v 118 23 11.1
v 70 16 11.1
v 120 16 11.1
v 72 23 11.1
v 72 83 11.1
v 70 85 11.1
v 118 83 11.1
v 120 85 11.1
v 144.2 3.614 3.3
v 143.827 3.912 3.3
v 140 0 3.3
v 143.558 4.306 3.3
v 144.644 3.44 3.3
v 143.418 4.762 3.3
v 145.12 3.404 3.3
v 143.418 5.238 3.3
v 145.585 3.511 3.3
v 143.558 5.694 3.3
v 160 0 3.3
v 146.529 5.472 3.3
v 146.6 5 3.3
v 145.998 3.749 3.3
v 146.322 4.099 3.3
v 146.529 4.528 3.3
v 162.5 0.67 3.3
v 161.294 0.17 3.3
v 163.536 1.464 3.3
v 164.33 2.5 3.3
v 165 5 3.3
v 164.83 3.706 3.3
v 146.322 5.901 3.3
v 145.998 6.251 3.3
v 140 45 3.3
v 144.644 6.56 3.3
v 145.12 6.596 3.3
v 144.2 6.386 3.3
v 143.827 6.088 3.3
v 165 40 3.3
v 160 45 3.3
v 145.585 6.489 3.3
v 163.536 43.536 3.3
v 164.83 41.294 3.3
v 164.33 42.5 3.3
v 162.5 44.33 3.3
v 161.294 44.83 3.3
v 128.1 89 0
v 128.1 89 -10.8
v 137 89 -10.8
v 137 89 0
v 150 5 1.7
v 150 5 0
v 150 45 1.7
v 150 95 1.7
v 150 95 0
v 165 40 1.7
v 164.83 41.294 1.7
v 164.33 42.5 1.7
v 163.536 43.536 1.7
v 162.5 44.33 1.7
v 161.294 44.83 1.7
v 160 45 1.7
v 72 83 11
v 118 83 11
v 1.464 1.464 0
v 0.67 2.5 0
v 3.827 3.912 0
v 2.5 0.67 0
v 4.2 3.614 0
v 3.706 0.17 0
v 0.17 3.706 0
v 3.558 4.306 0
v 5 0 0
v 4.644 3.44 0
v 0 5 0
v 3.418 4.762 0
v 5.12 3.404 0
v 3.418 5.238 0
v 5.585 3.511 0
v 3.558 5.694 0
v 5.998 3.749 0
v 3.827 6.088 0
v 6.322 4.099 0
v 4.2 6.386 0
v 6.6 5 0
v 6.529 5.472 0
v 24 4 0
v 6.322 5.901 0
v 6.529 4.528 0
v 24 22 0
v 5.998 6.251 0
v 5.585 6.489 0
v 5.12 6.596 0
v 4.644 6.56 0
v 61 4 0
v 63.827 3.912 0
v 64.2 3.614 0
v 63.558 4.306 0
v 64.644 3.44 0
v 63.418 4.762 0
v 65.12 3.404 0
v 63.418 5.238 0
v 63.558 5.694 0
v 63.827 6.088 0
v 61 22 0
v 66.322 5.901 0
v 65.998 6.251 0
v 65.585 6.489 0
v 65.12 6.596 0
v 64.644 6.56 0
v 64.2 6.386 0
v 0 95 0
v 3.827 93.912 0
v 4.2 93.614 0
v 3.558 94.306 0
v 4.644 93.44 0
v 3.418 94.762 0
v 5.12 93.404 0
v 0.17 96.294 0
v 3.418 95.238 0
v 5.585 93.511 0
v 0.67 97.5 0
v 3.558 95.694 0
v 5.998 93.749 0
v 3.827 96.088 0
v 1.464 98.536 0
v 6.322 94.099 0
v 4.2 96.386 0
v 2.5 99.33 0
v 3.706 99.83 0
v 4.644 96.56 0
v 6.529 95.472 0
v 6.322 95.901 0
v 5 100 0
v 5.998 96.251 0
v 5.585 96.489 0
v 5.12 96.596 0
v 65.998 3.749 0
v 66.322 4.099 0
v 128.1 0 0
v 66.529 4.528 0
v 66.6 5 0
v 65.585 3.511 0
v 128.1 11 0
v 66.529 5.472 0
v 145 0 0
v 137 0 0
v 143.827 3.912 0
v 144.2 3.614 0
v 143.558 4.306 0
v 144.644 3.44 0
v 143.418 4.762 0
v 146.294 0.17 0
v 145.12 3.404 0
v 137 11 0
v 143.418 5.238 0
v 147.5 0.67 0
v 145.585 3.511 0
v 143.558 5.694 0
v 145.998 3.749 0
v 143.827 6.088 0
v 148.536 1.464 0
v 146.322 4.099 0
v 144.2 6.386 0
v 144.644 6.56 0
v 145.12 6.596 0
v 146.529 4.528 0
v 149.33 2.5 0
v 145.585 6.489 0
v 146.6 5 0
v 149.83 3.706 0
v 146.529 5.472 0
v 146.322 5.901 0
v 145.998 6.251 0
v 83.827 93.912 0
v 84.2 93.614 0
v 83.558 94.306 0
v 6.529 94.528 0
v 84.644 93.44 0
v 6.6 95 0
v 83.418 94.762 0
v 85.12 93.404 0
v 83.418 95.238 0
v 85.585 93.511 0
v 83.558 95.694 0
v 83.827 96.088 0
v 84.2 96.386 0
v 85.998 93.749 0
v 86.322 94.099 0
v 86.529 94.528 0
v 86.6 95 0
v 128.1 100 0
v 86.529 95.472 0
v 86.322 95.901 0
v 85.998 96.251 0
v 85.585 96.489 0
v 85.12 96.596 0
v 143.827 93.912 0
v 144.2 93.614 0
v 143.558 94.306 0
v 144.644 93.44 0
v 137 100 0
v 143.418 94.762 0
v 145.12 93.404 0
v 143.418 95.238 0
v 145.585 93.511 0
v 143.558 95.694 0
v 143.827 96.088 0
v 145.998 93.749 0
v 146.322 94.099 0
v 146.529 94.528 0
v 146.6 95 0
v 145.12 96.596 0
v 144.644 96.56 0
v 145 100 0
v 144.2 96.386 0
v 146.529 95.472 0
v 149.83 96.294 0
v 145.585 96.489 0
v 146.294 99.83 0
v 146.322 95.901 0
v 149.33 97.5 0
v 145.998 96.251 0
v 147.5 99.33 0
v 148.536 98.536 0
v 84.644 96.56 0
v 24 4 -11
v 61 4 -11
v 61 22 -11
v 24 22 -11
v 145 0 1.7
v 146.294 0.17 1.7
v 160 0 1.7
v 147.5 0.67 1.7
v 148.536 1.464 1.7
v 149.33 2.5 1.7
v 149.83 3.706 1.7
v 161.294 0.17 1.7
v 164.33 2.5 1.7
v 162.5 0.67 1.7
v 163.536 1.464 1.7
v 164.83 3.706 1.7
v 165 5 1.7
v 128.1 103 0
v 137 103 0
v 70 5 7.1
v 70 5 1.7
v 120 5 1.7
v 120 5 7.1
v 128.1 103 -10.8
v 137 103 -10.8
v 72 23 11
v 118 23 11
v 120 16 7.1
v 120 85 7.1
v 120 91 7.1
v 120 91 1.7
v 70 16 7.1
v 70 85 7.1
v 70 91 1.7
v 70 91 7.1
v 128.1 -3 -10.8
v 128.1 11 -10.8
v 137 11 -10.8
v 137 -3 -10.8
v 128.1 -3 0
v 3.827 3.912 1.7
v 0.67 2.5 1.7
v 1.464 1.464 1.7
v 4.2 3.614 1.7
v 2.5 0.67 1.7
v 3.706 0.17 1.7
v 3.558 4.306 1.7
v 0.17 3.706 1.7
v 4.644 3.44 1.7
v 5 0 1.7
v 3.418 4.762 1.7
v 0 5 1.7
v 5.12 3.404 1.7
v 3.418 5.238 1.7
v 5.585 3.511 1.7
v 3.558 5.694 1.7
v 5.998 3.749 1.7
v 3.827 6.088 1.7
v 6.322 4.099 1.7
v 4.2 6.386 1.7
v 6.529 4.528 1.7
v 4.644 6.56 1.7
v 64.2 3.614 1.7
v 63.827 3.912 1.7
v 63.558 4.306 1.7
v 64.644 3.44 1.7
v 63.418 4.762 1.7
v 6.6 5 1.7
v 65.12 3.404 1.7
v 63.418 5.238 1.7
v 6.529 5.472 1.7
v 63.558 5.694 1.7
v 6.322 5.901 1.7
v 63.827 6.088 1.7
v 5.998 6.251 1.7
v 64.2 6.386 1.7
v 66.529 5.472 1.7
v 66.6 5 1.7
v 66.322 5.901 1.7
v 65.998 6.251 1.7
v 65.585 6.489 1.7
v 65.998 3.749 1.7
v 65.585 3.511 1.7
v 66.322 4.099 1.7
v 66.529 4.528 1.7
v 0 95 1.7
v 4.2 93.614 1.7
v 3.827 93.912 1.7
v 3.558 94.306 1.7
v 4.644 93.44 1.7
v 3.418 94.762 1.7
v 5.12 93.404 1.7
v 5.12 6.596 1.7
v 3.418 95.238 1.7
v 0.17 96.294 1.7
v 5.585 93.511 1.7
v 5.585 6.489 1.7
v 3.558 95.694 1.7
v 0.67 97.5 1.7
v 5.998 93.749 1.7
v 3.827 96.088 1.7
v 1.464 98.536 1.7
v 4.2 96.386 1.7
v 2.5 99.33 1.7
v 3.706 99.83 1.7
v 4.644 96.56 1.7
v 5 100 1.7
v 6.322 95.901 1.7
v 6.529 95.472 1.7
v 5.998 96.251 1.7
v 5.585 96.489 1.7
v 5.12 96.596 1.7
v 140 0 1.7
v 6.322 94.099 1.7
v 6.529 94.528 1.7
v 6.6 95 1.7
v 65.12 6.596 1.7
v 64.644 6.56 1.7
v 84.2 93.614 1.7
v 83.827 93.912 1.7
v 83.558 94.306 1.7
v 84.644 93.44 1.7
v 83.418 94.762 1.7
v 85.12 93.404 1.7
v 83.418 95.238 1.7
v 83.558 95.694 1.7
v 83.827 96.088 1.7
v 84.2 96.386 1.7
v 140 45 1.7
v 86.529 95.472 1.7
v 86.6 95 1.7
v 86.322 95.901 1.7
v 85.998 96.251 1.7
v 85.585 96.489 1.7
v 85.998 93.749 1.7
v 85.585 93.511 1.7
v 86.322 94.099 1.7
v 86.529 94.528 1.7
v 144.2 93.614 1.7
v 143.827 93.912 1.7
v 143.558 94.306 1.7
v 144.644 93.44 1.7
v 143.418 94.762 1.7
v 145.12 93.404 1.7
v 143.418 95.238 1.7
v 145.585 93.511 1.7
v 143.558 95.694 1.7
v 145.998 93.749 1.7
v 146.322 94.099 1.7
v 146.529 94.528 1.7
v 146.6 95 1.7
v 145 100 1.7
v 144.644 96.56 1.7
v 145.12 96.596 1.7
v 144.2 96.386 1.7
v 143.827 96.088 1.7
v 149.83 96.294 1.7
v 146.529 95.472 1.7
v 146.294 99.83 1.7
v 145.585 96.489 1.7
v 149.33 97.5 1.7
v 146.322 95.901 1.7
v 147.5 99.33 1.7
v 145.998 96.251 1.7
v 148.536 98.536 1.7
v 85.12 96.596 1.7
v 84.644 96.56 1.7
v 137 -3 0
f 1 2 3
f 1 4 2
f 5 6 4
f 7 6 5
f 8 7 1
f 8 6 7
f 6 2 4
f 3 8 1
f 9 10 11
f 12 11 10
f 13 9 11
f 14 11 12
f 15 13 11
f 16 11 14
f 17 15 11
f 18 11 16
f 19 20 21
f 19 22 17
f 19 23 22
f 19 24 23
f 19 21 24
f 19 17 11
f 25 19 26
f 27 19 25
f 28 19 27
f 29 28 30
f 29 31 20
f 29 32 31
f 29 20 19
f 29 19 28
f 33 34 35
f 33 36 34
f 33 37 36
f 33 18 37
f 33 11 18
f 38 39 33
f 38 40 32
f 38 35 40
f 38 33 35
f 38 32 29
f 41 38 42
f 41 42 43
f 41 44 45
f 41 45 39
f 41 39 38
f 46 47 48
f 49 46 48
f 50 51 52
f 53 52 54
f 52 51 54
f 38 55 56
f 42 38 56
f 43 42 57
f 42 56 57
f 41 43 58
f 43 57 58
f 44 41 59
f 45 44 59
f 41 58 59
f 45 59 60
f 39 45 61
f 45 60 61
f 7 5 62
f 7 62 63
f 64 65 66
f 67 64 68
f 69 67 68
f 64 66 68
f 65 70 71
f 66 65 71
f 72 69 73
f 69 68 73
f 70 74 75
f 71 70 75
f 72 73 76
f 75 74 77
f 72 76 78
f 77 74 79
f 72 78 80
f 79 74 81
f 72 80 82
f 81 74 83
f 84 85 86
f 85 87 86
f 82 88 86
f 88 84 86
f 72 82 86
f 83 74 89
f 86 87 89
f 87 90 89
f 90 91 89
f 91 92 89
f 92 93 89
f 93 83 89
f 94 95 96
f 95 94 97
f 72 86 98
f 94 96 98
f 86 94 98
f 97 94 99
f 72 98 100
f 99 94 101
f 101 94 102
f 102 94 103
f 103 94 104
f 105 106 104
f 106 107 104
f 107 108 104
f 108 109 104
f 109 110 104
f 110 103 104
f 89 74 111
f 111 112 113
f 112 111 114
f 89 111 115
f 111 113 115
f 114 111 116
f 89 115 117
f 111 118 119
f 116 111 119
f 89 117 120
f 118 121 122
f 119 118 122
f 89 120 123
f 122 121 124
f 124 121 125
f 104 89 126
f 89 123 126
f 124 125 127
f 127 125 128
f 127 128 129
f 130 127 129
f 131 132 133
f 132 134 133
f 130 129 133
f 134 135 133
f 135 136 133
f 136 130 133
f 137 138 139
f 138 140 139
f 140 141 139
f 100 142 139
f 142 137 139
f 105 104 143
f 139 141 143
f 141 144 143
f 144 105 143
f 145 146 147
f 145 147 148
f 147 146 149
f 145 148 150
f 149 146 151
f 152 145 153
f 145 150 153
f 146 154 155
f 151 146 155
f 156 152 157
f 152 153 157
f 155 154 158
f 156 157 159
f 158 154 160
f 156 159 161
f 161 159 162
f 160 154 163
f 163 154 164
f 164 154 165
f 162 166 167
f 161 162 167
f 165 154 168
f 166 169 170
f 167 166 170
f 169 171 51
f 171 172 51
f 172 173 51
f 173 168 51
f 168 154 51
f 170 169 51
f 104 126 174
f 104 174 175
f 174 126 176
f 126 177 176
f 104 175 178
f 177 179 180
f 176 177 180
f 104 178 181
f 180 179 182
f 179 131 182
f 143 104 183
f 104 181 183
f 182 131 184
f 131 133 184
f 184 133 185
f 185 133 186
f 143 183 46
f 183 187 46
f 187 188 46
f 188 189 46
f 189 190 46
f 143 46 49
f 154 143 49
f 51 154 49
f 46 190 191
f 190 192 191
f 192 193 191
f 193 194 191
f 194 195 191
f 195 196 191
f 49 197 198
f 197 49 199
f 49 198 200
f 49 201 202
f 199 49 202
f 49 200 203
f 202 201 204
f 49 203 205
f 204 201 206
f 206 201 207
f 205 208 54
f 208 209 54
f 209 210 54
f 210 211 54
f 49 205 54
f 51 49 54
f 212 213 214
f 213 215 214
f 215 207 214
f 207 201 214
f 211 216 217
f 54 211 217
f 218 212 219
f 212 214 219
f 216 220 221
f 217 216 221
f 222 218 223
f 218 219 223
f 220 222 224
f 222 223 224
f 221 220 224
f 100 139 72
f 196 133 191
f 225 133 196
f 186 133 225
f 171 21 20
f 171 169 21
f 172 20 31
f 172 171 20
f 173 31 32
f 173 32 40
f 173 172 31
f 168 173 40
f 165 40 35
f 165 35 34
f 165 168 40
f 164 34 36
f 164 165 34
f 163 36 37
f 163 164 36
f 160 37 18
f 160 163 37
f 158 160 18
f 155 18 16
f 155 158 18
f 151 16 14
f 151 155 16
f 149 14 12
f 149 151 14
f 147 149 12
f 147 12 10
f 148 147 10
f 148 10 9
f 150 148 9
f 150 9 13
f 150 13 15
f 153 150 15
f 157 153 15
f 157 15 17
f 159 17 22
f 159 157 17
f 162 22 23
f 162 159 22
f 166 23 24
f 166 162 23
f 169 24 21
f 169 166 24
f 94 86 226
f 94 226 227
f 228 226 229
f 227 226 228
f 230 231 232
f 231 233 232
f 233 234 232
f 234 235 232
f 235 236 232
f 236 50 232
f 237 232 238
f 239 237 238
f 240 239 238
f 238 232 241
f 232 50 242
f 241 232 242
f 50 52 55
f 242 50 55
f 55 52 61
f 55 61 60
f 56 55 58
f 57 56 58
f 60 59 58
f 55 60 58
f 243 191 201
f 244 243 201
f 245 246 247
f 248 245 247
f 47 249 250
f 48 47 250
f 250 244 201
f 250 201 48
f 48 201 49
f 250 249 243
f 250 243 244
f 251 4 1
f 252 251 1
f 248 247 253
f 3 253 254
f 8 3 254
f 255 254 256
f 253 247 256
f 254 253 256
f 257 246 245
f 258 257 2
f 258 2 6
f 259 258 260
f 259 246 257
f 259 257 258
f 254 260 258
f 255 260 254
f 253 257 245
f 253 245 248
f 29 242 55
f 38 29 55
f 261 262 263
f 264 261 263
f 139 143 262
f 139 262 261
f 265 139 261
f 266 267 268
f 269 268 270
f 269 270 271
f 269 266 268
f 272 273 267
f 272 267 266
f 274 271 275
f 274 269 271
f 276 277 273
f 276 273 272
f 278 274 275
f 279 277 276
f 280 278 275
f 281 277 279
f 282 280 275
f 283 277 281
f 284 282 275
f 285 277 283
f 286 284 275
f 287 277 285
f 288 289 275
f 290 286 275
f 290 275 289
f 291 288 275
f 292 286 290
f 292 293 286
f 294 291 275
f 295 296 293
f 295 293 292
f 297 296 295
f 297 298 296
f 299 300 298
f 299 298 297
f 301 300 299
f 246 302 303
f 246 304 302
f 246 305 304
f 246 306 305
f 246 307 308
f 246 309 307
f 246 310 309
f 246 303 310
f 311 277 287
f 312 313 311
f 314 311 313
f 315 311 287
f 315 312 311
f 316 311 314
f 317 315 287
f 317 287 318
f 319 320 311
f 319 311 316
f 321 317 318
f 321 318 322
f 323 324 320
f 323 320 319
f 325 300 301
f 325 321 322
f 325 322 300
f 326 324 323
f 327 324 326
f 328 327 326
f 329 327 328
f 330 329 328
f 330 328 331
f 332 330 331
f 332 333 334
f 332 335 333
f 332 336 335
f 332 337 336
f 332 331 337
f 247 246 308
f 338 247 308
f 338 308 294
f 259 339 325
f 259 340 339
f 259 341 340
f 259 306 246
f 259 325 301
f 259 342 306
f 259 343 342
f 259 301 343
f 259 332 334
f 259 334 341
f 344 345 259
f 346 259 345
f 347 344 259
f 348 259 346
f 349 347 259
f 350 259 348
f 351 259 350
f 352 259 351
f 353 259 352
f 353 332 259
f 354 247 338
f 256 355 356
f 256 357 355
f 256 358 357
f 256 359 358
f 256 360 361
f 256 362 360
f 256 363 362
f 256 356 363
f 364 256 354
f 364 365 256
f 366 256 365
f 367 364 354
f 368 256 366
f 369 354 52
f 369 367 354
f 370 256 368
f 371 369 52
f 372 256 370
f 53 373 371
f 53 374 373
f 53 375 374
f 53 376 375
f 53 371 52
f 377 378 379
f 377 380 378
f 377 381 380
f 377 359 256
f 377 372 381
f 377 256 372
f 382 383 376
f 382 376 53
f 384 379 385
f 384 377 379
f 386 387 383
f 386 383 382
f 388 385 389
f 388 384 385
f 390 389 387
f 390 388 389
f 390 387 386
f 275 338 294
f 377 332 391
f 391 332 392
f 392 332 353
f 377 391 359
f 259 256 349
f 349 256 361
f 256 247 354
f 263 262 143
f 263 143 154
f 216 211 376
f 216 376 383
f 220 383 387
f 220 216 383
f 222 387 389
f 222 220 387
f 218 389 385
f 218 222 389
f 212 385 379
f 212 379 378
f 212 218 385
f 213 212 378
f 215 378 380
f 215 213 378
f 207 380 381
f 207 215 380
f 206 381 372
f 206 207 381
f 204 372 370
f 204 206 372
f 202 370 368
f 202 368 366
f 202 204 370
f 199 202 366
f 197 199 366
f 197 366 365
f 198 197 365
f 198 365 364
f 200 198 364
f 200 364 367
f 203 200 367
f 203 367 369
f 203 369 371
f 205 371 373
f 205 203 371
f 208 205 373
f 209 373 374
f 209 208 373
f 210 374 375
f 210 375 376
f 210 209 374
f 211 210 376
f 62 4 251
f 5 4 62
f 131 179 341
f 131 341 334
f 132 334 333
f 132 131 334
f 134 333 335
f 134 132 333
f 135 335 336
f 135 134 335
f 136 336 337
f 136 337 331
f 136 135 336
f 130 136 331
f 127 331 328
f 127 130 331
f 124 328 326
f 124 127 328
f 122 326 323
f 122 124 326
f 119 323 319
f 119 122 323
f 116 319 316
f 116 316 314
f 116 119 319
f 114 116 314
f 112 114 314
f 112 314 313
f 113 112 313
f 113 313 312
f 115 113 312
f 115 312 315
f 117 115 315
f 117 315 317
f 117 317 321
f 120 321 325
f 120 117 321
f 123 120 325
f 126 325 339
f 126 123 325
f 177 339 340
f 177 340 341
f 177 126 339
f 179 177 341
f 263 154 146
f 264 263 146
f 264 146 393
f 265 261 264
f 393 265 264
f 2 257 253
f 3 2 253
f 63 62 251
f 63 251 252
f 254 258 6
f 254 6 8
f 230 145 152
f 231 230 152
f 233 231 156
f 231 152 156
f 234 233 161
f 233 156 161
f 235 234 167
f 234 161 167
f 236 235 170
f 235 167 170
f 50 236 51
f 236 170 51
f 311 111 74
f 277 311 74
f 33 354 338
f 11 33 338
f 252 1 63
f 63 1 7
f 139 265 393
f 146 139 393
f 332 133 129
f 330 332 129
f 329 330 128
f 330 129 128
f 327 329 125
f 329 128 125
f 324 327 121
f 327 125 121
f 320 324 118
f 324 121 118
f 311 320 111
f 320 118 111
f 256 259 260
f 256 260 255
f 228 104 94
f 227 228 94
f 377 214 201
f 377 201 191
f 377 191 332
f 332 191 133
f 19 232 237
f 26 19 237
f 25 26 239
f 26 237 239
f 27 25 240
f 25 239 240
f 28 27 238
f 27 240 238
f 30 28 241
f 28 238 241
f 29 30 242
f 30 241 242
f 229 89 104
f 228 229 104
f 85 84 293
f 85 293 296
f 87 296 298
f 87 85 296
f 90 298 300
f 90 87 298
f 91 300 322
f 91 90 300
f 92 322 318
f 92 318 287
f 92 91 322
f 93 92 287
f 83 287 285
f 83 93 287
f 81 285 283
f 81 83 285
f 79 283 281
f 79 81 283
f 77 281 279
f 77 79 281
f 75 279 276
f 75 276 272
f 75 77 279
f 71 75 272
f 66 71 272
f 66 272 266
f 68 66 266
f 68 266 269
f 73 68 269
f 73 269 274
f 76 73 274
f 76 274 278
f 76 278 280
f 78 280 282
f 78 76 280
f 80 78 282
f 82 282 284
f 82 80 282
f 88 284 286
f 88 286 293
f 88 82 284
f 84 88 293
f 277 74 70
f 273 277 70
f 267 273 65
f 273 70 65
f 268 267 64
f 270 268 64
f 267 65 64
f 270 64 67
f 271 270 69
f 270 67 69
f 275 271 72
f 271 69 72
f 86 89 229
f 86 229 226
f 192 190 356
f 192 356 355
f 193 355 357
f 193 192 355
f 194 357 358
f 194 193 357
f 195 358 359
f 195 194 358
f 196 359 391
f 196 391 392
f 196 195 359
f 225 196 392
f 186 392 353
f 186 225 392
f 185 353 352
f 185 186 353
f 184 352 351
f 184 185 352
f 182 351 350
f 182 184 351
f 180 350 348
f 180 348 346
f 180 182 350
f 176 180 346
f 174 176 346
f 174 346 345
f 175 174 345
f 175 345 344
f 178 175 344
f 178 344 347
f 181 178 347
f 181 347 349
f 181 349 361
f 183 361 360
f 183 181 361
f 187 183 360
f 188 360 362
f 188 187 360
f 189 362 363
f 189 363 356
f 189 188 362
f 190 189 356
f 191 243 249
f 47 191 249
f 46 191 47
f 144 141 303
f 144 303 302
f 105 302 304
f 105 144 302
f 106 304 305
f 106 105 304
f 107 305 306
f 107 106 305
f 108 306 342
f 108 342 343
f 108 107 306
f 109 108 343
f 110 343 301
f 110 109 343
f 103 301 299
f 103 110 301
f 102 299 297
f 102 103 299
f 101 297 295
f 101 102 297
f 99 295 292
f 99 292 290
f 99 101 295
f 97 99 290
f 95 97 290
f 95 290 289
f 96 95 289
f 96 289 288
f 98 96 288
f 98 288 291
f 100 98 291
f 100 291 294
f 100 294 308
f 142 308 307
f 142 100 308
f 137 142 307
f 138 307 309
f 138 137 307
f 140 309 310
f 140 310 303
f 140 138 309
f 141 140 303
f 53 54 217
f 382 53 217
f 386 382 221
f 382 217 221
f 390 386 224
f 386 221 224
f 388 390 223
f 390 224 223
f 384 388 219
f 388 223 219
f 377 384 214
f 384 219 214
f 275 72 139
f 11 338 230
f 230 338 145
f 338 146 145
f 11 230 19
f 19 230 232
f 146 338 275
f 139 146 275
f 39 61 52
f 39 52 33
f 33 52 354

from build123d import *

# Parameters (mm, degrees)
F0_R      = 1.6
F1_DEPTH  = 1.7
F2_W      = 50
F2_H      = 86
F3_DEPTH  = 5.4
F4_W      = 50
F4_H      = 69
F5_DEPTH  = 4
F6_W      = 46
F6_H      = 60
F7_DEPTH  = 0.1
F8_R      = 1.6
F9_DEPTH  = 1.6
F10_W     = 37
F10_H     = 18
F11_DEPTH = 11
F12_W     = 8.9
F12_H     = 14
F13_DEPTH = 10.8


with BuildPart() as f1:
    # F0 (on Top) → F1 (new body)
    with BuildSketch(Plane.XY):
        with BuildLine():
            ThreePointArc((0, 5), (1.464466, 1.464466), (5, 0))
            Line((5, 0), (145, 0))
            ThreePointArc((145, 0), (148.535534, 1.464466), (150, 5))
            Line((150, 5), (150, 95))
            ThreePointArc((150, 95), (148.535534, 98.535534), (145, 100))
            Line((145, 100), (5, 100))
            ThreePointArc((5, 100), (1.464466, 98.535534), (0, 95))
            Line((0, 95), (0, 5))
        make_face()
        with Locations((5, 5)):
            Circle(F0_R, mode=Mode.SUBTRACT)
        with Locations((65, 5)):
            Circle(F0_R, mode=Mode.SUBTRACT)
        with Locations((145, 5)):
            Circle(F0_R, mode=Mode.SUBTRACT)
        with Locations((5, 95)):
            Circle(F0_R, mode=Mode.SUBTRACT)
        with Locations((85, 95)):
            Circle(F0_R, mode=Mode.SUBTRACT)
        with Locations((145, 95)):
            Circle(F0_R, mode=Mode.SUBTRACT)
    extrude(amount=F1_DEPTH)

    # F2 (on face) → F3 (join)
    with BuildSketch(Plane.XY.offset(1.7)):
        with Locations((95, 48)):
            Rectangle(F2_W, F2_H)
    extrude(amount=F3_DEPTH)

    # F4 (on face) → F5 (join)
    with BuildSketch(Plane.XY.offset(7.1)):
        with Locations((95, 50.5)):
            Rectangle(F4_W, F4_H)
    extrude(amount=F5_DEPTH)

    # F6 (on face) → F7 (cut)
    with BuildSketch(Plane.XY.offset(11.1)):
        with Locations((95, 53)):
            Rectangle(F6_W, F6_H)
    extrude(amount=-F7_DEPTH, mode=Mode.SUBTRACT)

    # F8 (on face) → F9 (join)
    with BuildSketch(Plane.XY.offset(1.7)):
        with BuildLine():
            Line((140, 45), (140, 0))
            Line((140, 0), (160, 0))
            ThreePointArc((160, 0), (163.535534, 1.464466), (165, 5))
            Line((165, 5), (165, 40))
            ThreePointArc((165, 40), (163.535534, 43.535534), (160, 45))
            Line((160, 45), (140, 45))
        make_face()
        with Locations((145, 5)):
            Circle(F8_R, mode=Mode.SUBTRACT)
    extrude(amount=F9_DEPTH)

    # F10 (on face) → F11 (join)
    with BuildSketch(Plane(origin=(0, 0, 0), x_dir=(1, 0, 0), z_dir=(0, 0, -1))):
        with Locations((42.5, -13)):
            Rectangle(F10_W, F10_H)
    extrude(amount=F11_DEPTH)

    # F12 (on face) → F13 (join)
    with BuildSketch(Plane(origin=(0, 0, 0), x_dir=(1, 0, 0), z_dir=(0, 0, -1))):
        with Locations((132.55, -96)):
            Rectangle(F12_W, F12_H)
        with Locations((132.55, -4)):
            Rectangle(F12_W, F12_H)
    extrude(amount=F13_DEPTH)


solid = f1.part
